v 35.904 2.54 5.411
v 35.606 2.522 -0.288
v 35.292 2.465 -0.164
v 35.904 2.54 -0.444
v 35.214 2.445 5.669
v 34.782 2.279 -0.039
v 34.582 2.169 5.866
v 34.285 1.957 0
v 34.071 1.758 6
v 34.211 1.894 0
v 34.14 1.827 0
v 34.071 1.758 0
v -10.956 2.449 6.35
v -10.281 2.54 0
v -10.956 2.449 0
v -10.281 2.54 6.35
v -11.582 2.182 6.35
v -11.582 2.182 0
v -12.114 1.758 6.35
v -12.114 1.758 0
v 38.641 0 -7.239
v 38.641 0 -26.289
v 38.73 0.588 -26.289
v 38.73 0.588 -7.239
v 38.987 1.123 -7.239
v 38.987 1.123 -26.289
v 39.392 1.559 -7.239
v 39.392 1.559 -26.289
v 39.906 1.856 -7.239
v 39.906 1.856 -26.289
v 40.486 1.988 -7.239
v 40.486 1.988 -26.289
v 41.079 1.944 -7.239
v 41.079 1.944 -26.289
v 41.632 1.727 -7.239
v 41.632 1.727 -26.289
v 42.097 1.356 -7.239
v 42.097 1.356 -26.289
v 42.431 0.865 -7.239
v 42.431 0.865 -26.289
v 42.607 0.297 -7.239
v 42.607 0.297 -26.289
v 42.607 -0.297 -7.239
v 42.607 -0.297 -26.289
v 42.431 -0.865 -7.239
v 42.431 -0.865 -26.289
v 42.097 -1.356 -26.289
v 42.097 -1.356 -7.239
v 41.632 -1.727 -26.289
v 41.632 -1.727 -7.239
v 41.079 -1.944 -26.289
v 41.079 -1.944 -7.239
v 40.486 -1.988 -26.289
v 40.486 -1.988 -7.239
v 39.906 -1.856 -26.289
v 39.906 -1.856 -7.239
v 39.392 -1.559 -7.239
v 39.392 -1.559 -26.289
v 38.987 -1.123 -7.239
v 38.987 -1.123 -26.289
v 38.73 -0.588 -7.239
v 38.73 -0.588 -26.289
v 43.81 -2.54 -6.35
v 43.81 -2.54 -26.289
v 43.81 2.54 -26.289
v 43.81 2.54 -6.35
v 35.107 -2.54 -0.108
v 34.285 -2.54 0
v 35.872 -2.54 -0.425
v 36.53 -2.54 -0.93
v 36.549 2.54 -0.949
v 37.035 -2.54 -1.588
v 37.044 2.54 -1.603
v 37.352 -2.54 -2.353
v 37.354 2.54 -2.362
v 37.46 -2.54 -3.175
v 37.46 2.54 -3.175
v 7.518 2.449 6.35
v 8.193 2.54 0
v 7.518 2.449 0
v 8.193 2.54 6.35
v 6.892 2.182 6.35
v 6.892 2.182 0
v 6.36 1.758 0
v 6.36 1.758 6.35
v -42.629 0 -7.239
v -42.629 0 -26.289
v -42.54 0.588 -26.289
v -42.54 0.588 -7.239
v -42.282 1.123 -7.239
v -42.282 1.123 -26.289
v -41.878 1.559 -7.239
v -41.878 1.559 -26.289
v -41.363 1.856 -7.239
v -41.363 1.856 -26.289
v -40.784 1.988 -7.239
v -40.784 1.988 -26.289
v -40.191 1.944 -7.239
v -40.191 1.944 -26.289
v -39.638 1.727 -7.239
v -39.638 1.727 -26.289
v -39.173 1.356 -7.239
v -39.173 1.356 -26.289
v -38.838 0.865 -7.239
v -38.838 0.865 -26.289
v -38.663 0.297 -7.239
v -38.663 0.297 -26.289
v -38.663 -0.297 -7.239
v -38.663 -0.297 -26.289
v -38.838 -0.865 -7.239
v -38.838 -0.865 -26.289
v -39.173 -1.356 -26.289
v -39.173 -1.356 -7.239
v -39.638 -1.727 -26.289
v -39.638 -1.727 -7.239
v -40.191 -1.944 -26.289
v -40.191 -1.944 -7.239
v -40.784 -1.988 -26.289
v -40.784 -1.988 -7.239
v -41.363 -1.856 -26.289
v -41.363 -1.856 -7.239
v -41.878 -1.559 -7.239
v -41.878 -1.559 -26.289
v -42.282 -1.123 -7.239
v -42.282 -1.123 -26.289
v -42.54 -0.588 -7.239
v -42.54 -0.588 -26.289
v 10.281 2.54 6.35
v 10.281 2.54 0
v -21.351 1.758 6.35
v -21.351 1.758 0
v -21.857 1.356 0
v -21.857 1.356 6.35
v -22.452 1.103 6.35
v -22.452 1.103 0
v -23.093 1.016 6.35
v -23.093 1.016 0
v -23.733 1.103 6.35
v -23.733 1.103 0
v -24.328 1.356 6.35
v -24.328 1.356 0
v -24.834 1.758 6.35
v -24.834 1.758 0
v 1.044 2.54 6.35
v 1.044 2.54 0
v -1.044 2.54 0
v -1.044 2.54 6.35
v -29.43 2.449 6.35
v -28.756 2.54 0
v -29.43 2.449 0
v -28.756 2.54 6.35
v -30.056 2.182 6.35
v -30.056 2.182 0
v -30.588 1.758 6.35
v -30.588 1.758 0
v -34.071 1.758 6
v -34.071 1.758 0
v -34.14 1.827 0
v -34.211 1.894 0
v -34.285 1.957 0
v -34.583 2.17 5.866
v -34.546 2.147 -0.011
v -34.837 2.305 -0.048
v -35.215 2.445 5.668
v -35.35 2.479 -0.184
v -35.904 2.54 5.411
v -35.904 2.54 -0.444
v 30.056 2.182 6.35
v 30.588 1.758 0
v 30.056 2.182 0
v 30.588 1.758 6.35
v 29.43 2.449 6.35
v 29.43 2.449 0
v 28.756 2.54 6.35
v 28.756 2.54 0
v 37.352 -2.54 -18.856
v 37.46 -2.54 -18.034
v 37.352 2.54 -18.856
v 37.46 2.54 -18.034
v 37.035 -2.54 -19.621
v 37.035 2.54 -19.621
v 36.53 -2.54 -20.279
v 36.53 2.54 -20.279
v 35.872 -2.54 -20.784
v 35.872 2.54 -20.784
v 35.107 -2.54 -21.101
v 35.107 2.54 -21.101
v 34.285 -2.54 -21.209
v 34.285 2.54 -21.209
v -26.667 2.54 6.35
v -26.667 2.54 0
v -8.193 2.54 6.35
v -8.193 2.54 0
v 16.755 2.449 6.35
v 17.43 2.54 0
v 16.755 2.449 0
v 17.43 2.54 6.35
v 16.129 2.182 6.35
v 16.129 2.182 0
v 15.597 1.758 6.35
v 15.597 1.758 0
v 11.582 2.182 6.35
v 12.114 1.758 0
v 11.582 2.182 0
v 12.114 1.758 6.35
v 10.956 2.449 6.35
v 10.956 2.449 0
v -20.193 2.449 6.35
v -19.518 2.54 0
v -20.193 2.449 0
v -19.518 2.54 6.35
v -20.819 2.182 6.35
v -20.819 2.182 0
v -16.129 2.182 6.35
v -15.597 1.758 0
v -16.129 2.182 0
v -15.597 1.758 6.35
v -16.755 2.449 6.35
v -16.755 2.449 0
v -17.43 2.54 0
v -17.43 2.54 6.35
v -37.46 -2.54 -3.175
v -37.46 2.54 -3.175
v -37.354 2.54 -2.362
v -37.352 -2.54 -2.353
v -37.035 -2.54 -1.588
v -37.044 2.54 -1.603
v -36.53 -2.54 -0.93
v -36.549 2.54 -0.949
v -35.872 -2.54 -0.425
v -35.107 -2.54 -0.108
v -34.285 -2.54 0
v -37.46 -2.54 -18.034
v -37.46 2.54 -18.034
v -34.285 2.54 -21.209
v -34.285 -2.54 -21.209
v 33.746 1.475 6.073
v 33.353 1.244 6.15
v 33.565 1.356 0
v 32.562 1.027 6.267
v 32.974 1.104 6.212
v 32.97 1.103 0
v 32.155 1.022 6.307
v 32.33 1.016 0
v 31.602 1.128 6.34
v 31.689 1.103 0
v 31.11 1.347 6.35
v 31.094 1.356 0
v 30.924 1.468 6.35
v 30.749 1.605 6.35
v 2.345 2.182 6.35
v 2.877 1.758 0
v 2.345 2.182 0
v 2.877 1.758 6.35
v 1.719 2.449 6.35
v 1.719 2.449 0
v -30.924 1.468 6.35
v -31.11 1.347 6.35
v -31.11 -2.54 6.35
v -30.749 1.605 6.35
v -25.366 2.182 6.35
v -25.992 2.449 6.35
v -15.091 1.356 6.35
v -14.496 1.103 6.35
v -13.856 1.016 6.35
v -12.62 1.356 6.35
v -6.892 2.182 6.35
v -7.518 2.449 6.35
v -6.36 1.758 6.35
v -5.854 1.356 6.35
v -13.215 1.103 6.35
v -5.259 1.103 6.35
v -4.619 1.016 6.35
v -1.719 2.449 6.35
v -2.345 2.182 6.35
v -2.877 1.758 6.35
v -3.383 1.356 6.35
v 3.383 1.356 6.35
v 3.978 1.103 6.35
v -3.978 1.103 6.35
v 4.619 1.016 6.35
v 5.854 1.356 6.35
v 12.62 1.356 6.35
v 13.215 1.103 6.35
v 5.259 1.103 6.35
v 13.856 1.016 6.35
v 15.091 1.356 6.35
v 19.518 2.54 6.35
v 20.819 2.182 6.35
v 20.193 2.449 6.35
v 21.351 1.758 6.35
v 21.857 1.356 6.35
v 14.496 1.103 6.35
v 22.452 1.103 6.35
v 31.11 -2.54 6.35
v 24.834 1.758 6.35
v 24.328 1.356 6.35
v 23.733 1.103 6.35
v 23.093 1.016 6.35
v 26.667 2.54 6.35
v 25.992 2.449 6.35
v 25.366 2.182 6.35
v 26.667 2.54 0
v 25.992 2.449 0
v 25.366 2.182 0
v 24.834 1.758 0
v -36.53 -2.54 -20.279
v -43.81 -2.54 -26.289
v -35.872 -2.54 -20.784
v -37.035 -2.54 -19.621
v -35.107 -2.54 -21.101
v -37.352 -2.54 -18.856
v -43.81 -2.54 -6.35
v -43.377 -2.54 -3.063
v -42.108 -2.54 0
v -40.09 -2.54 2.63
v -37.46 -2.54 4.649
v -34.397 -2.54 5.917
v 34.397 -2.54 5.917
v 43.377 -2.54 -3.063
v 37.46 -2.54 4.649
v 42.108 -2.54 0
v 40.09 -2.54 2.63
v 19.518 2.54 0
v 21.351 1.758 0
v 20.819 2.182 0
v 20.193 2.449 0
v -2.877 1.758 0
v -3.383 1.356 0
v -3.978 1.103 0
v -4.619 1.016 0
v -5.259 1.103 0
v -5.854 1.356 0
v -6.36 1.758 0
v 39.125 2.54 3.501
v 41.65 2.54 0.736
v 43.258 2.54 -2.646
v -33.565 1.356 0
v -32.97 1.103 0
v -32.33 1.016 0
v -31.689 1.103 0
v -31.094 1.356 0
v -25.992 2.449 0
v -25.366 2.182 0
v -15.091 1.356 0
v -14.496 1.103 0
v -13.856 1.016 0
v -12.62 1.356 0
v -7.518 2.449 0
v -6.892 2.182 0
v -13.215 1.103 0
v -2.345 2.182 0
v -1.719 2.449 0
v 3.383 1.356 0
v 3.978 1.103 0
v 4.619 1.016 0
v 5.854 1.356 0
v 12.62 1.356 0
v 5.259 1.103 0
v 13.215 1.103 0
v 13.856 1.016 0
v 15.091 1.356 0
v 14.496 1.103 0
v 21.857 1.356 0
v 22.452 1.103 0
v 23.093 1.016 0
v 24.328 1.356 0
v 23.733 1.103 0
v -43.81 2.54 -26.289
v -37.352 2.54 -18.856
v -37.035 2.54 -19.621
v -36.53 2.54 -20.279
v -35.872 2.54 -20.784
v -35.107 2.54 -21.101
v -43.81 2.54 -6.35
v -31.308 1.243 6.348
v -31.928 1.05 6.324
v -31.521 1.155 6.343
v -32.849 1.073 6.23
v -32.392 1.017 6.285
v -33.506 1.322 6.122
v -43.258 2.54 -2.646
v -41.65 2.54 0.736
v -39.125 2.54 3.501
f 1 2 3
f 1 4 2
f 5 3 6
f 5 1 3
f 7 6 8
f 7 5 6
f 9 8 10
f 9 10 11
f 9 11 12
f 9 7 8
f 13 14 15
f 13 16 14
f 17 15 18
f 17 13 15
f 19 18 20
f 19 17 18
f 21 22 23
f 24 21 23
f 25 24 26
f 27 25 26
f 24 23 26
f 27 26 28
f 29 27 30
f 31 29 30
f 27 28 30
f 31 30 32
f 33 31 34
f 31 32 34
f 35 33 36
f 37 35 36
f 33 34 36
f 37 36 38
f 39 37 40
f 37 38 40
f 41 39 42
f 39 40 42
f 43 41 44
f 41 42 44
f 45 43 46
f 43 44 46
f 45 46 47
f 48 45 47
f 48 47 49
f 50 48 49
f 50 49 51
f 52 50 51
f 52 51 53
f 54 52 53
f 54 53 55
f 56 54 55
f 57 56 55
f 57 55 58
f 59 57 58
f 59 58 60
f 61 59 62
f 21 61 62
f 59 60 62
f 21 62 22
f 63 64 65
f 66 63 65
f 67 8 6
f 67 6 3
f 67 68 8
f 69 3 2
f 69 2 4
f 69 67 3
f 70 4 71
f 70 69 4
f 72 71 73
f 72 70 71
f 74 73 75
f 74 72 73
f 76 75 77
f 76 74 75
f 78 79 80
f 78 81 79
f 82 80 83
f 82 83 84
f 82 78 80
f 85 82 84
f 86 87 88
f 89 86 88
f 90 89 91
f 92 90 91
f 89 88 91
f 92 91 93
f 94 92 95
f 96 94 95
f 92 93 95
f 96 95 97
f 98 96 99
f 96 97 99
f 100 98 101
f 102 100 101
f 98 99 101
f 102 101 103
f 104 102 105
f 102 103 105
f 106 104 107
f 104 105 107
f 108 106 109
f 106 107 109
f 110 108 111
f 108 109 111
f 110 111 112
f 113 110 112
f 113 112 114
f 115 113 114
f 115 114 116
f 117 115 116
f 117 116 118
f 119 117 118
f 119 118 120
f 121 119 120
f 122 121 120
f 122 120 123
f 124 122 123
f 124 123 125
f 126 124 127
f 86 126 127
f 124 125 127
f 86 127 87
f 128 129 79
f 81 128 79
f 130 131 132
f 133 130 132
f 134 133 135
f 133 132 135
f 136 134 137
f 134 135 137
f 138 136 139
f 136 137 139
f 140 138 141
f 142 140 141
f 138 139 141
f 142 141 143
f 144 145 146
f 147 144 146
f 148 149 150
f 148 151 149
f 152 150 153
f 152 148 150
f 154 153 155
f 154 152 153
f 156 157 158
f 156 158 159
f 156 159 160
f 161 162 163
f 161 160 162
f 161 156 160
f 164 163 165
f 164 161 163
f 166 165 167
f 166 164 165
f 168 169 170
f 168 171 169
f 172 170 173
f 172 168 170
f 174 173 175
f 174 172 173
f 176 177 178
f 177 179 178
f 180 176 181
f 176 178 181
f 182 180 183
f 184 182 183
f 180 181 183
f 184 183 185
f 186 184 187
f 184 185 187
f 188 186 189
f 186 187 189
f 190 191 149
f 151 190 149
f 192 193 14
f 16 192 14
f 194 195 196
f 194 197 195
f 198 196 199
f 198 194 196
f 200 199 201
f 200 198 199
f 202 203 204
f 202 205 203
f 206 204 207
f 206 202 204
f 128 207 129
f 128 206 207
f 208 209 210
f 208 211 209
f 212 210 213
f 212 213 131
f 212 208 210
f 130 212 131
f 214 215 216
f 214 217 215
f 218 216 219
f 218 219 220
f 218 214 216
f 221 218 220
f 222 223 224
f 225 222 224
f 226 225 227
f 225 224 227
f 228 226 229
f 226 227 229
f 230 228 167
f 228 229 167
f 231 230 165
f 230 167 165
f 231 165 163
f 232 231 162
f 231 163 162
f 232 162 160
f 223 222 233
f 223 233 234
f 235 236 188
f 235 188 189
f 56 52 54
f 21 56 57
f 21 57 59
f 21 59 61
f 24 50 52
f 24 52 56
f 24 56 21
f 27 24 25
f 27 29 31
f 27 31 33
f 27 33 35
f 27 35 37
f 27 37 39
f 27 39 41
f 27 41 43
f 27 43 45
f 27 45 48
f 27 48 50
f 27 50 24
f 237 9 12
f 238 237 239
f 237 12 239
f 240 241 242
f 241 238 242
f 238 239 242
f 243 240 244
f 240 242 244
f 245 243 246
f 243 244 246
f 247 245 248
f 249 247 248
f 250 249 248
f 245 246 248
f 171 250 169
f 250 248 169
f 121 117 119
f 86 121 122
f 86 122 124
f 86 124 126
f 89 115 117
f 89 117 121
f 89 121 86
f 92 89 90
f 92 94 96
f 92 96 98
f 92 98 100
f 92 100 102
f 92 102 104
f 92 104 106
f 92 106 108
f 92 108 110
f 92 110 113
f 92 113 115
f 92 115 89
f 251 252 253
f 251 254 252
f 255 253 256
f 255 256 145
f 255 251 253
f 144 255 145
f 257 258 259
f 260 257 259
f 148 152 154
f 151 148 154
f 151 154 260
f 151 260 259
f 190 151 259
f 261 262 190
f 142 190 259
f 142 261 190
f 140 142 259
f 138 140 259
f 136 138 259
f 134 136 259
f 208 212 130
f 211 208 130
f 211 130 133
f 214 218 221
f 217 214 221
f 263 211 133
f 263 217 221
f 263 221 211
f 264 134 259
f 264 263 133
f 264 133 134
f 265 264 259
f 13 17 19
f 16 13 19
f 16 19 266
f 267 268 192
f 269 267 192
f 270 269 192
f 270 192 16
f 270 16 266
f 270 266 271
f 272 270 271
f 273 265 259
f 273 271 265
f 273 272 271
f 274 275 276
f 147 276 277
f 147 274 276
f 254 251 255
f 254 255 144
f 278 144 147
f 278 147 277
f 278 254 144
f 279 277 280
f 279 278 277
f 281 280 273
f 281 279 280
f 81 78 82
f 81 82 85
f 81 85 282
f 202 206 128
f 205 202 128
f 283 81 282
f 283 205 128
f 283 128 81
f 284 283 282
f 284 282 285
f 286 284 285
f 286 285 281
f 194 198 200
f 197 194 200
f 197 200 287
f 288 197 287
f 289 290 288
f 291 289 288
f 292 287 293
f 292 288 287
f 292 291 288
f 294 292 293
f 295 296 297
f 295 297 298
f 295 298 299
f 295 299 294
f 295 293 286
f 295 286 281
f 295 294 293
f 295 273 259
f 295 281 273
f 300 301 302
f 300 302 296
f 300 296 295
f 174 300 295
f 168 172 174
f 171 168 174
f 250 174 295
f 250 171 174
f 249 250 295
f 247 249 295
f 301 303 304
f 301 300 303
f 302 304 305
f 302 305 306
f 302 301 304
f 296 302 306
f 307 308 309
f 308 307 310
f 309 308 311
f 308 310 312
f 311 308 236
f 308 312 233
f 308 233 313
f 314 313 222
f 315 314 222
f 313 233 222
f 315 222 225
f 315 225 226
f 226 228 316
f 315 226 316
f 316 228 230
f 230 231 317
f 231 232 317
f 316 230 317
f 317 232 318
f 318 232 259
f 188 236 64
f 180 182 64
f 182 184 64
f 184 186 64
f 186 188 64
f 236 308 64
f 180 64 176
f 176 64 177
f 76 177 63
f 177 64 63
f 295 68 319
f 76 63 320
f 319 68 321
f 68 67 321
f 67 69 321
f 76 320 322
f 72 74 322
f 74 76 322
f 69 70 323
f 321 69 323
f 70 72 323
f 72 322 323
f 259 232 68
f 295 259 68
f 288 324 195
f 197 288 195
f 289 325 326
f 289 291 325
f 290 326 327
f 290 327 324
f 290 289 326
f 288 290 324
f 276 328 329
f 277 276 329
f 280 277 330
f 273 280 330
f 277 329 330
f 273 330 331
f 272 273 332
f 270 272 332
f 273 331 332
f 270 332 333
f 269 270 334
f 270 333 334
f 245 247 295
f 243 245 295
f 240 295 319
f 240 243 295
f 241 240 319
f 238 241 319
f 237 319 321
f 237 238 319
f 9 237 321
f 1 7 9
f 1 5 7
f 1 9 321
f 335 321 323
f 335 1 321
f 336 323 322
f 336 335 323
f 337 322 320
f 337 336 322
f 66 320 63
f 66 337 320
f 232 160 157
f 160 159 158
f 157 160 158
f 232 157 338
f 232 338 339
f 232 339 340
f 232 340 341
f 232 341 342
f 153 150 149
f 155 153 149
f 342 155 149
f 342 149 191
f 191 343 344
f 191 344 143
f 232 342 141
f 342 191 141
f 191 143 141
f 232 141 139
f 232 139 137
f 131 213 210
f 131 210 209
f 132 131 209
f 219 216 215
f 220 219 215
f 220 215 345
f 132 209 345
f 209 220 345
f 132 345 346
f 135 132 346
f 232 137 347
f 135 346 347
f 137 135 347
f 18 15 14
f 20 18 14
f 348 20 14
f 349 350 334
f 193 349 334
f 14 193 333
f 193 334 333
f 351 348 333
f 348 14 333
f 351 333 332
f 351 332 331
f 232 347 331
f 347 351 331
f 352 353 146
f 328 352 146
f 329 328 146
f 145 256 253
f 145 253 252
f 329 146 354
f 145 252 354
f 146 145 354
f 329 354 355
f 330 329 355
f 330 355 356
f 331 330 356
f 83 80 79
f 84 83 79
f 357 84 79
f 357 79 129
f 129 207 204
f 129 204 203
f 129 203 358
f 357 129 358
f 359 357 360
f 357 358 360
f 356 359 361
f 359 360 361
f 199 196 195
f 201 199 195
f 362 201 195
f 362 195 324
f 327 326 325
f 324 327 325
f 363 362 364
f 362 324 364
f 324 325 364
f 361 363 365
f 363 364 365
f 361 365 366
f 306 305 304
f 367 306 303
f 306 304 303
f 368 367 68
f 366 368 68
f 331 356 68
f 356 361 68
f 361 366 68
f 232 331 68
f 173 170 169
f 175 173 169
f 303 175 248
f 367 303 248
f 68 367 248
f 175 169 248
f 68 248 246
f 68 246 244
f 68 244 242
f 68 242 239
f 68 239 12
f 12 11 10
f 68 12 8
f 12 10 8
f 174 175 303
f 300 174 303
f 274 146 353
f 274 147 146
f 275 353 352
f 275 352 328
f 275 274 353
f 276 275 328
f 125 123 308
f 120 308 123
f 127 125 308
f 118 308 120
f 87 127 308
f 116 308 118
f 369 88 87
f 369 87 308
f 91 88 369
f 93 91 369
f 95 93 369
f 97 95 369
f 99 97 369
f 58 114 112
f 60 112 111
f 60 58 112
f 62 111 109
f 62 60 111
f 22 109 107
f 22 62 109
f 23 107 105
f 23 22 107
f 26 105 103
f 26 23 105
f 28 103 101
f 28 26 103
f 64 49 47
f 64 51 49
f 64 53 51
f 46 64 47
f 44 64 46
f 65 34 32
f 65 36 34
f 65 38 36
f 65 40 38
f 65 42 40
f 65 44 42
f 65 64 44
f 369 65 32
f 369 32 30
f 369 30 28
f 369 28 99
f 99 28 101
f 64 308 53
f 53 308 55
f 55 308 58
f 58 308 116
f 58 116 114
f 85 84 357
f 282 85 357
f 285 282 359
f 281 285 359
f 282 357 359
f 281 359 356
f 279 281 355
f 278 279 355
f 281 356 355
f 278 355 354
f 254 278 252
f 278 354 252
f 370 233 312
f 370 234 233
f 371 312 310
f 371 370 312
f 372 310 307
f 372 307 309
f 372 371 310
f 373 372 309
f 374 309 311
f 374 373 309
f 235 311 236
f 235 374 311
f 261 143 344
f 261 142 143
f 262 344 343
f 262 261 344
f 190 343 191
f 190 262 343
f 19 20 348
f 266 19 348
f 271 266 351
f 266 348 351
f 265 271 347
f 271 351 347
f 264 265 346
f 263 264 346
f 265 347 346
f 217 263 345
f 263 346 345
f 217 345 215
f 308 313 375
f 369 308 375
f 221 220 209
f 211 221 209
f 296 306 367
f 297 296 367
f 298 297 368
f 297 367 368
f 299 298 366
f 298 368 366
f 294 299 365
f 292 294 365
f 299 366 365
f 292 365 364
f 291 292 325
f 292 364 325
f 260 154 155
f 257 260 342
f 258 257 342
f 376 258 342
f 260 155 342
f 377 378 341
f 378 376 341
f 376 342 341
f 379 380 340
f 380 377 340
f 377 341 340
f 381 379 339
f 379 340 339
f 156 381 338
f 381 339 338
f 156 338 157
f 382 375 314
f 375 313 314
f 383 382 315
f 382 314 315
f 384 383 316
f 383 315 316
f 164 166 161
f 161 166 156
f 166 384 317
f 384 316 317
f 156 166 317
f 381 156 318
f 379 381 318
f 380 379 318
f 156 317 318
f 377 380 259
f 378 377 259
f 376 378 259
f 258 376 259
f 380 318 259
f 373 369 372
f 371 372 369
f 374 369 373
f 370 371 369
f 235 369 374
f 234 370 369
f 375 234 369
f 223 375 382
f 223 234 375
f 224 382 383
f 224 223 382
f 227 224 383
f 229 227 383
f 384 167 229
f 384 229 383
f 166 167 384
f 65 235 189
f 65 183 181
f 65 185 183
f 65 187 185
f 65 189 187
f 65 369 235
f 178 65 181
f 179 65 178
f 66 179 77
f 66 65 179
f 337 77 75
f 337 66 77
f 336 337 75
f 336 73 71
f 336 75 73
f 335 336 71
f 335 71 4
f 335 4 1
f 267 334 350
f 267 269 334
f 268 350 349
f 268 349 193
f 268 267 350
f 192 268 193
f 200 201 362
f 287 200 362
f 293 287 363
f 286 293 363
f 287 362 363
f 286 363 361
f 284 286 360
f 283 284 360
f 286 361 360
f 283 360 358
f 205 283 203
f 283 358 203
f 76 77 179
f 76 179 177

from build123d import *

# Parameters (mm, degrees)
BOSS_EXTRUDE1_DEPTH = 6.35
FILLET1_R           = 2.54
SKETCH1_3_W         = 6.35
SKETCH1_3_H         = 5.08
BOSS_EXTRUDE2_DEPTH = 26.289
SKETCH2_R           = 1.9939
CUT_EXTRUDE1_DEPTH  = 19.05
SKETCH3_W           = 5.08
SKETCH3_H           = 5.08
BOSS_EXTRUDE3_DEPTH = 74.91984
FILLET2_R           = 3.175
FILLET3_R           = 12.7


with BuildPart() as part:
    # Sketch1 → Boss-Extrude1 (new body)
    with BuildSketch(Plane.XY):
        with BuildLine():
            Line((-43.80992, 2.54), (-43.80992, -2.54))
            Line((-43.80992, -2.54), (43.80992, -2.54))
            Line((43.80992, -2.54), (43.80992, 2.54))
            Line((43.80992, 2.54), (34.572886058, 2.54))
            ThreePointArc((34.572886058, 2.54), (32.329618798, 1.016), (30.086351538, 2.54))
            Line((30.086351538, 2.54), (25.335852116, 2.54))
            ThreePointArc((25.335852116, 2.54), (23.092584856, 1.016), (20.849317595, 2.54))
            Line((20.849317595, 2.54), (16.098818173, 2.54))
            ThreePointArc((16.098818173, 2.54), (13.855550913, 1.016), (11.612283653, 2.54))
            Line((11.612283653, 2.54), (6.861784231, 2.54))
            ThreePointArc((6.861784231, 2.54), (4.618516971, 1.016), (2.375249711, 2.54))
            Line((2.375249711, 2.54), (-2.375249711, 2.54))
            ThreePointArc((-2.375249711, 2.54), (-4.618516971, 1.016), (-6.861784231, 2.54))
            Line((-6.861784231, 2.54), (-11.612283653, 2.54))
            ThreePointArc((-11.612283653, 2.54), (-13.855550913, 1.016), (-16.098818173, 2.54))
            Line((-16.098818173, 2.54), (-20.849317595, 2.54))
            ThreePointArc((-20.849317595, 2.54), (-23.092584856, 1.016), (-25.335852116, 2.54))
            Line((-25.335852116, 2.54), (-30.086351538, 2.54))
            ThreePointArc((-30.086351538, 2.54), (-32.329618798, 1.016), (-34.572886058, 2.54))
            Line((-34.572886058, 2.54), (-43.80992, 2.54))
        make_face()
    extrude(amount=BOSS_EXTRUDE1_DEPTH)

    # Fillet1
    fillet1_edges = [part.edges().sort_by_distance(p)[0] for p in [
        (-34.572886058, 2.54, 3.175),
        (-30.086351538, 2.54, 3.175),
        (-25.335852116, 2.54, 3.175),
        (-20.849317595, 2.54, 3.175),
        (-16.098818173, 2.54, 3.175),
        (-11.612283653, 2.54, 3.175),
        (-6.861784231, 2.54, 3.175),
        (-2.375249711, 2.54, 3.175),
        (2.375249711, 2.54, 3.175),
        (6.861784231, 2.54, 3.175),
        (11.612283653, 2.54, 3.175),
        (16.098818173, 2.54, 3.175),
        (20.849317595, 2.54, 3.175),
        (25.335852116, 2.54, 3.175),
        (30.086351538, 2.54, 3.175),
        (34.572886058, 2.54, 3.175),
    ]]
    fillet(fillet1_edges, radius=FILLET1_R)

    # Sketch1<3> → Boss-Extrude2 (add)
    with BuildSketch(Plane.XY):
        with Locations((-40.63492, 0)):
            Rectangle(SKETCH1_3_W, SKETCH1_3_H)
        Polygon((37.45992, 0), (37.45992, -2.54), (43.80992, -2.54), (43.80992, 2.54), (37.45992, 2.54), align=None)
    extrude(amount=-BOSS_EXTRUDE2_DEPTH)

    # Sketch2 → Cut-Extrude1 (cut)
    with BuildSketch(Plane(origin=(0, 0, -26.289), x_dir=(-1, 0, 0), z_dir=(0, 0, -1))):
        with Locations((-40.63492, 0)):
            Circle(SKETCH2_R)
        with Locations((40.63492, 0)):
            Circle(SKETCH2_R)
    extrude(amount=-CUT_EXTRUDE1_DEPTH, mode=Mode.SUBTRACT)

    # Sketch3 → Boss-Extrude3 (add)
    with BuildSketch(Plane.ZY.offset(-37.45992)):
        with Locations((-23.749, 0)):
            Rectangle(SKETCH3_W, SKETCH3_H)
    extrude(amount=BOSS_EXTRUDE3_DEPTH)

    # Fillet2
    fillet2_edges = [part.edges().sort_by_distance(p)[0] for p in [
        (37.45992, 0, -21.209),
        (-37.45992, 0, -21.209),
        (-37.45992, 0, 0),
        (37.45992, 0, 0),
    ]]
    fillet(fillet2_edges, radius=FILLET2_R)

    # Fillet3
    fillet3_edges = [part.edges().sort_by_distance(p)[0] for p in [
        (-43.80992, 0, 6.35),
        (43.80992, 0, 6.35),
    ]]
    fillet(fillet3_edges, radius=FILLET3_R)


solid = part.part
